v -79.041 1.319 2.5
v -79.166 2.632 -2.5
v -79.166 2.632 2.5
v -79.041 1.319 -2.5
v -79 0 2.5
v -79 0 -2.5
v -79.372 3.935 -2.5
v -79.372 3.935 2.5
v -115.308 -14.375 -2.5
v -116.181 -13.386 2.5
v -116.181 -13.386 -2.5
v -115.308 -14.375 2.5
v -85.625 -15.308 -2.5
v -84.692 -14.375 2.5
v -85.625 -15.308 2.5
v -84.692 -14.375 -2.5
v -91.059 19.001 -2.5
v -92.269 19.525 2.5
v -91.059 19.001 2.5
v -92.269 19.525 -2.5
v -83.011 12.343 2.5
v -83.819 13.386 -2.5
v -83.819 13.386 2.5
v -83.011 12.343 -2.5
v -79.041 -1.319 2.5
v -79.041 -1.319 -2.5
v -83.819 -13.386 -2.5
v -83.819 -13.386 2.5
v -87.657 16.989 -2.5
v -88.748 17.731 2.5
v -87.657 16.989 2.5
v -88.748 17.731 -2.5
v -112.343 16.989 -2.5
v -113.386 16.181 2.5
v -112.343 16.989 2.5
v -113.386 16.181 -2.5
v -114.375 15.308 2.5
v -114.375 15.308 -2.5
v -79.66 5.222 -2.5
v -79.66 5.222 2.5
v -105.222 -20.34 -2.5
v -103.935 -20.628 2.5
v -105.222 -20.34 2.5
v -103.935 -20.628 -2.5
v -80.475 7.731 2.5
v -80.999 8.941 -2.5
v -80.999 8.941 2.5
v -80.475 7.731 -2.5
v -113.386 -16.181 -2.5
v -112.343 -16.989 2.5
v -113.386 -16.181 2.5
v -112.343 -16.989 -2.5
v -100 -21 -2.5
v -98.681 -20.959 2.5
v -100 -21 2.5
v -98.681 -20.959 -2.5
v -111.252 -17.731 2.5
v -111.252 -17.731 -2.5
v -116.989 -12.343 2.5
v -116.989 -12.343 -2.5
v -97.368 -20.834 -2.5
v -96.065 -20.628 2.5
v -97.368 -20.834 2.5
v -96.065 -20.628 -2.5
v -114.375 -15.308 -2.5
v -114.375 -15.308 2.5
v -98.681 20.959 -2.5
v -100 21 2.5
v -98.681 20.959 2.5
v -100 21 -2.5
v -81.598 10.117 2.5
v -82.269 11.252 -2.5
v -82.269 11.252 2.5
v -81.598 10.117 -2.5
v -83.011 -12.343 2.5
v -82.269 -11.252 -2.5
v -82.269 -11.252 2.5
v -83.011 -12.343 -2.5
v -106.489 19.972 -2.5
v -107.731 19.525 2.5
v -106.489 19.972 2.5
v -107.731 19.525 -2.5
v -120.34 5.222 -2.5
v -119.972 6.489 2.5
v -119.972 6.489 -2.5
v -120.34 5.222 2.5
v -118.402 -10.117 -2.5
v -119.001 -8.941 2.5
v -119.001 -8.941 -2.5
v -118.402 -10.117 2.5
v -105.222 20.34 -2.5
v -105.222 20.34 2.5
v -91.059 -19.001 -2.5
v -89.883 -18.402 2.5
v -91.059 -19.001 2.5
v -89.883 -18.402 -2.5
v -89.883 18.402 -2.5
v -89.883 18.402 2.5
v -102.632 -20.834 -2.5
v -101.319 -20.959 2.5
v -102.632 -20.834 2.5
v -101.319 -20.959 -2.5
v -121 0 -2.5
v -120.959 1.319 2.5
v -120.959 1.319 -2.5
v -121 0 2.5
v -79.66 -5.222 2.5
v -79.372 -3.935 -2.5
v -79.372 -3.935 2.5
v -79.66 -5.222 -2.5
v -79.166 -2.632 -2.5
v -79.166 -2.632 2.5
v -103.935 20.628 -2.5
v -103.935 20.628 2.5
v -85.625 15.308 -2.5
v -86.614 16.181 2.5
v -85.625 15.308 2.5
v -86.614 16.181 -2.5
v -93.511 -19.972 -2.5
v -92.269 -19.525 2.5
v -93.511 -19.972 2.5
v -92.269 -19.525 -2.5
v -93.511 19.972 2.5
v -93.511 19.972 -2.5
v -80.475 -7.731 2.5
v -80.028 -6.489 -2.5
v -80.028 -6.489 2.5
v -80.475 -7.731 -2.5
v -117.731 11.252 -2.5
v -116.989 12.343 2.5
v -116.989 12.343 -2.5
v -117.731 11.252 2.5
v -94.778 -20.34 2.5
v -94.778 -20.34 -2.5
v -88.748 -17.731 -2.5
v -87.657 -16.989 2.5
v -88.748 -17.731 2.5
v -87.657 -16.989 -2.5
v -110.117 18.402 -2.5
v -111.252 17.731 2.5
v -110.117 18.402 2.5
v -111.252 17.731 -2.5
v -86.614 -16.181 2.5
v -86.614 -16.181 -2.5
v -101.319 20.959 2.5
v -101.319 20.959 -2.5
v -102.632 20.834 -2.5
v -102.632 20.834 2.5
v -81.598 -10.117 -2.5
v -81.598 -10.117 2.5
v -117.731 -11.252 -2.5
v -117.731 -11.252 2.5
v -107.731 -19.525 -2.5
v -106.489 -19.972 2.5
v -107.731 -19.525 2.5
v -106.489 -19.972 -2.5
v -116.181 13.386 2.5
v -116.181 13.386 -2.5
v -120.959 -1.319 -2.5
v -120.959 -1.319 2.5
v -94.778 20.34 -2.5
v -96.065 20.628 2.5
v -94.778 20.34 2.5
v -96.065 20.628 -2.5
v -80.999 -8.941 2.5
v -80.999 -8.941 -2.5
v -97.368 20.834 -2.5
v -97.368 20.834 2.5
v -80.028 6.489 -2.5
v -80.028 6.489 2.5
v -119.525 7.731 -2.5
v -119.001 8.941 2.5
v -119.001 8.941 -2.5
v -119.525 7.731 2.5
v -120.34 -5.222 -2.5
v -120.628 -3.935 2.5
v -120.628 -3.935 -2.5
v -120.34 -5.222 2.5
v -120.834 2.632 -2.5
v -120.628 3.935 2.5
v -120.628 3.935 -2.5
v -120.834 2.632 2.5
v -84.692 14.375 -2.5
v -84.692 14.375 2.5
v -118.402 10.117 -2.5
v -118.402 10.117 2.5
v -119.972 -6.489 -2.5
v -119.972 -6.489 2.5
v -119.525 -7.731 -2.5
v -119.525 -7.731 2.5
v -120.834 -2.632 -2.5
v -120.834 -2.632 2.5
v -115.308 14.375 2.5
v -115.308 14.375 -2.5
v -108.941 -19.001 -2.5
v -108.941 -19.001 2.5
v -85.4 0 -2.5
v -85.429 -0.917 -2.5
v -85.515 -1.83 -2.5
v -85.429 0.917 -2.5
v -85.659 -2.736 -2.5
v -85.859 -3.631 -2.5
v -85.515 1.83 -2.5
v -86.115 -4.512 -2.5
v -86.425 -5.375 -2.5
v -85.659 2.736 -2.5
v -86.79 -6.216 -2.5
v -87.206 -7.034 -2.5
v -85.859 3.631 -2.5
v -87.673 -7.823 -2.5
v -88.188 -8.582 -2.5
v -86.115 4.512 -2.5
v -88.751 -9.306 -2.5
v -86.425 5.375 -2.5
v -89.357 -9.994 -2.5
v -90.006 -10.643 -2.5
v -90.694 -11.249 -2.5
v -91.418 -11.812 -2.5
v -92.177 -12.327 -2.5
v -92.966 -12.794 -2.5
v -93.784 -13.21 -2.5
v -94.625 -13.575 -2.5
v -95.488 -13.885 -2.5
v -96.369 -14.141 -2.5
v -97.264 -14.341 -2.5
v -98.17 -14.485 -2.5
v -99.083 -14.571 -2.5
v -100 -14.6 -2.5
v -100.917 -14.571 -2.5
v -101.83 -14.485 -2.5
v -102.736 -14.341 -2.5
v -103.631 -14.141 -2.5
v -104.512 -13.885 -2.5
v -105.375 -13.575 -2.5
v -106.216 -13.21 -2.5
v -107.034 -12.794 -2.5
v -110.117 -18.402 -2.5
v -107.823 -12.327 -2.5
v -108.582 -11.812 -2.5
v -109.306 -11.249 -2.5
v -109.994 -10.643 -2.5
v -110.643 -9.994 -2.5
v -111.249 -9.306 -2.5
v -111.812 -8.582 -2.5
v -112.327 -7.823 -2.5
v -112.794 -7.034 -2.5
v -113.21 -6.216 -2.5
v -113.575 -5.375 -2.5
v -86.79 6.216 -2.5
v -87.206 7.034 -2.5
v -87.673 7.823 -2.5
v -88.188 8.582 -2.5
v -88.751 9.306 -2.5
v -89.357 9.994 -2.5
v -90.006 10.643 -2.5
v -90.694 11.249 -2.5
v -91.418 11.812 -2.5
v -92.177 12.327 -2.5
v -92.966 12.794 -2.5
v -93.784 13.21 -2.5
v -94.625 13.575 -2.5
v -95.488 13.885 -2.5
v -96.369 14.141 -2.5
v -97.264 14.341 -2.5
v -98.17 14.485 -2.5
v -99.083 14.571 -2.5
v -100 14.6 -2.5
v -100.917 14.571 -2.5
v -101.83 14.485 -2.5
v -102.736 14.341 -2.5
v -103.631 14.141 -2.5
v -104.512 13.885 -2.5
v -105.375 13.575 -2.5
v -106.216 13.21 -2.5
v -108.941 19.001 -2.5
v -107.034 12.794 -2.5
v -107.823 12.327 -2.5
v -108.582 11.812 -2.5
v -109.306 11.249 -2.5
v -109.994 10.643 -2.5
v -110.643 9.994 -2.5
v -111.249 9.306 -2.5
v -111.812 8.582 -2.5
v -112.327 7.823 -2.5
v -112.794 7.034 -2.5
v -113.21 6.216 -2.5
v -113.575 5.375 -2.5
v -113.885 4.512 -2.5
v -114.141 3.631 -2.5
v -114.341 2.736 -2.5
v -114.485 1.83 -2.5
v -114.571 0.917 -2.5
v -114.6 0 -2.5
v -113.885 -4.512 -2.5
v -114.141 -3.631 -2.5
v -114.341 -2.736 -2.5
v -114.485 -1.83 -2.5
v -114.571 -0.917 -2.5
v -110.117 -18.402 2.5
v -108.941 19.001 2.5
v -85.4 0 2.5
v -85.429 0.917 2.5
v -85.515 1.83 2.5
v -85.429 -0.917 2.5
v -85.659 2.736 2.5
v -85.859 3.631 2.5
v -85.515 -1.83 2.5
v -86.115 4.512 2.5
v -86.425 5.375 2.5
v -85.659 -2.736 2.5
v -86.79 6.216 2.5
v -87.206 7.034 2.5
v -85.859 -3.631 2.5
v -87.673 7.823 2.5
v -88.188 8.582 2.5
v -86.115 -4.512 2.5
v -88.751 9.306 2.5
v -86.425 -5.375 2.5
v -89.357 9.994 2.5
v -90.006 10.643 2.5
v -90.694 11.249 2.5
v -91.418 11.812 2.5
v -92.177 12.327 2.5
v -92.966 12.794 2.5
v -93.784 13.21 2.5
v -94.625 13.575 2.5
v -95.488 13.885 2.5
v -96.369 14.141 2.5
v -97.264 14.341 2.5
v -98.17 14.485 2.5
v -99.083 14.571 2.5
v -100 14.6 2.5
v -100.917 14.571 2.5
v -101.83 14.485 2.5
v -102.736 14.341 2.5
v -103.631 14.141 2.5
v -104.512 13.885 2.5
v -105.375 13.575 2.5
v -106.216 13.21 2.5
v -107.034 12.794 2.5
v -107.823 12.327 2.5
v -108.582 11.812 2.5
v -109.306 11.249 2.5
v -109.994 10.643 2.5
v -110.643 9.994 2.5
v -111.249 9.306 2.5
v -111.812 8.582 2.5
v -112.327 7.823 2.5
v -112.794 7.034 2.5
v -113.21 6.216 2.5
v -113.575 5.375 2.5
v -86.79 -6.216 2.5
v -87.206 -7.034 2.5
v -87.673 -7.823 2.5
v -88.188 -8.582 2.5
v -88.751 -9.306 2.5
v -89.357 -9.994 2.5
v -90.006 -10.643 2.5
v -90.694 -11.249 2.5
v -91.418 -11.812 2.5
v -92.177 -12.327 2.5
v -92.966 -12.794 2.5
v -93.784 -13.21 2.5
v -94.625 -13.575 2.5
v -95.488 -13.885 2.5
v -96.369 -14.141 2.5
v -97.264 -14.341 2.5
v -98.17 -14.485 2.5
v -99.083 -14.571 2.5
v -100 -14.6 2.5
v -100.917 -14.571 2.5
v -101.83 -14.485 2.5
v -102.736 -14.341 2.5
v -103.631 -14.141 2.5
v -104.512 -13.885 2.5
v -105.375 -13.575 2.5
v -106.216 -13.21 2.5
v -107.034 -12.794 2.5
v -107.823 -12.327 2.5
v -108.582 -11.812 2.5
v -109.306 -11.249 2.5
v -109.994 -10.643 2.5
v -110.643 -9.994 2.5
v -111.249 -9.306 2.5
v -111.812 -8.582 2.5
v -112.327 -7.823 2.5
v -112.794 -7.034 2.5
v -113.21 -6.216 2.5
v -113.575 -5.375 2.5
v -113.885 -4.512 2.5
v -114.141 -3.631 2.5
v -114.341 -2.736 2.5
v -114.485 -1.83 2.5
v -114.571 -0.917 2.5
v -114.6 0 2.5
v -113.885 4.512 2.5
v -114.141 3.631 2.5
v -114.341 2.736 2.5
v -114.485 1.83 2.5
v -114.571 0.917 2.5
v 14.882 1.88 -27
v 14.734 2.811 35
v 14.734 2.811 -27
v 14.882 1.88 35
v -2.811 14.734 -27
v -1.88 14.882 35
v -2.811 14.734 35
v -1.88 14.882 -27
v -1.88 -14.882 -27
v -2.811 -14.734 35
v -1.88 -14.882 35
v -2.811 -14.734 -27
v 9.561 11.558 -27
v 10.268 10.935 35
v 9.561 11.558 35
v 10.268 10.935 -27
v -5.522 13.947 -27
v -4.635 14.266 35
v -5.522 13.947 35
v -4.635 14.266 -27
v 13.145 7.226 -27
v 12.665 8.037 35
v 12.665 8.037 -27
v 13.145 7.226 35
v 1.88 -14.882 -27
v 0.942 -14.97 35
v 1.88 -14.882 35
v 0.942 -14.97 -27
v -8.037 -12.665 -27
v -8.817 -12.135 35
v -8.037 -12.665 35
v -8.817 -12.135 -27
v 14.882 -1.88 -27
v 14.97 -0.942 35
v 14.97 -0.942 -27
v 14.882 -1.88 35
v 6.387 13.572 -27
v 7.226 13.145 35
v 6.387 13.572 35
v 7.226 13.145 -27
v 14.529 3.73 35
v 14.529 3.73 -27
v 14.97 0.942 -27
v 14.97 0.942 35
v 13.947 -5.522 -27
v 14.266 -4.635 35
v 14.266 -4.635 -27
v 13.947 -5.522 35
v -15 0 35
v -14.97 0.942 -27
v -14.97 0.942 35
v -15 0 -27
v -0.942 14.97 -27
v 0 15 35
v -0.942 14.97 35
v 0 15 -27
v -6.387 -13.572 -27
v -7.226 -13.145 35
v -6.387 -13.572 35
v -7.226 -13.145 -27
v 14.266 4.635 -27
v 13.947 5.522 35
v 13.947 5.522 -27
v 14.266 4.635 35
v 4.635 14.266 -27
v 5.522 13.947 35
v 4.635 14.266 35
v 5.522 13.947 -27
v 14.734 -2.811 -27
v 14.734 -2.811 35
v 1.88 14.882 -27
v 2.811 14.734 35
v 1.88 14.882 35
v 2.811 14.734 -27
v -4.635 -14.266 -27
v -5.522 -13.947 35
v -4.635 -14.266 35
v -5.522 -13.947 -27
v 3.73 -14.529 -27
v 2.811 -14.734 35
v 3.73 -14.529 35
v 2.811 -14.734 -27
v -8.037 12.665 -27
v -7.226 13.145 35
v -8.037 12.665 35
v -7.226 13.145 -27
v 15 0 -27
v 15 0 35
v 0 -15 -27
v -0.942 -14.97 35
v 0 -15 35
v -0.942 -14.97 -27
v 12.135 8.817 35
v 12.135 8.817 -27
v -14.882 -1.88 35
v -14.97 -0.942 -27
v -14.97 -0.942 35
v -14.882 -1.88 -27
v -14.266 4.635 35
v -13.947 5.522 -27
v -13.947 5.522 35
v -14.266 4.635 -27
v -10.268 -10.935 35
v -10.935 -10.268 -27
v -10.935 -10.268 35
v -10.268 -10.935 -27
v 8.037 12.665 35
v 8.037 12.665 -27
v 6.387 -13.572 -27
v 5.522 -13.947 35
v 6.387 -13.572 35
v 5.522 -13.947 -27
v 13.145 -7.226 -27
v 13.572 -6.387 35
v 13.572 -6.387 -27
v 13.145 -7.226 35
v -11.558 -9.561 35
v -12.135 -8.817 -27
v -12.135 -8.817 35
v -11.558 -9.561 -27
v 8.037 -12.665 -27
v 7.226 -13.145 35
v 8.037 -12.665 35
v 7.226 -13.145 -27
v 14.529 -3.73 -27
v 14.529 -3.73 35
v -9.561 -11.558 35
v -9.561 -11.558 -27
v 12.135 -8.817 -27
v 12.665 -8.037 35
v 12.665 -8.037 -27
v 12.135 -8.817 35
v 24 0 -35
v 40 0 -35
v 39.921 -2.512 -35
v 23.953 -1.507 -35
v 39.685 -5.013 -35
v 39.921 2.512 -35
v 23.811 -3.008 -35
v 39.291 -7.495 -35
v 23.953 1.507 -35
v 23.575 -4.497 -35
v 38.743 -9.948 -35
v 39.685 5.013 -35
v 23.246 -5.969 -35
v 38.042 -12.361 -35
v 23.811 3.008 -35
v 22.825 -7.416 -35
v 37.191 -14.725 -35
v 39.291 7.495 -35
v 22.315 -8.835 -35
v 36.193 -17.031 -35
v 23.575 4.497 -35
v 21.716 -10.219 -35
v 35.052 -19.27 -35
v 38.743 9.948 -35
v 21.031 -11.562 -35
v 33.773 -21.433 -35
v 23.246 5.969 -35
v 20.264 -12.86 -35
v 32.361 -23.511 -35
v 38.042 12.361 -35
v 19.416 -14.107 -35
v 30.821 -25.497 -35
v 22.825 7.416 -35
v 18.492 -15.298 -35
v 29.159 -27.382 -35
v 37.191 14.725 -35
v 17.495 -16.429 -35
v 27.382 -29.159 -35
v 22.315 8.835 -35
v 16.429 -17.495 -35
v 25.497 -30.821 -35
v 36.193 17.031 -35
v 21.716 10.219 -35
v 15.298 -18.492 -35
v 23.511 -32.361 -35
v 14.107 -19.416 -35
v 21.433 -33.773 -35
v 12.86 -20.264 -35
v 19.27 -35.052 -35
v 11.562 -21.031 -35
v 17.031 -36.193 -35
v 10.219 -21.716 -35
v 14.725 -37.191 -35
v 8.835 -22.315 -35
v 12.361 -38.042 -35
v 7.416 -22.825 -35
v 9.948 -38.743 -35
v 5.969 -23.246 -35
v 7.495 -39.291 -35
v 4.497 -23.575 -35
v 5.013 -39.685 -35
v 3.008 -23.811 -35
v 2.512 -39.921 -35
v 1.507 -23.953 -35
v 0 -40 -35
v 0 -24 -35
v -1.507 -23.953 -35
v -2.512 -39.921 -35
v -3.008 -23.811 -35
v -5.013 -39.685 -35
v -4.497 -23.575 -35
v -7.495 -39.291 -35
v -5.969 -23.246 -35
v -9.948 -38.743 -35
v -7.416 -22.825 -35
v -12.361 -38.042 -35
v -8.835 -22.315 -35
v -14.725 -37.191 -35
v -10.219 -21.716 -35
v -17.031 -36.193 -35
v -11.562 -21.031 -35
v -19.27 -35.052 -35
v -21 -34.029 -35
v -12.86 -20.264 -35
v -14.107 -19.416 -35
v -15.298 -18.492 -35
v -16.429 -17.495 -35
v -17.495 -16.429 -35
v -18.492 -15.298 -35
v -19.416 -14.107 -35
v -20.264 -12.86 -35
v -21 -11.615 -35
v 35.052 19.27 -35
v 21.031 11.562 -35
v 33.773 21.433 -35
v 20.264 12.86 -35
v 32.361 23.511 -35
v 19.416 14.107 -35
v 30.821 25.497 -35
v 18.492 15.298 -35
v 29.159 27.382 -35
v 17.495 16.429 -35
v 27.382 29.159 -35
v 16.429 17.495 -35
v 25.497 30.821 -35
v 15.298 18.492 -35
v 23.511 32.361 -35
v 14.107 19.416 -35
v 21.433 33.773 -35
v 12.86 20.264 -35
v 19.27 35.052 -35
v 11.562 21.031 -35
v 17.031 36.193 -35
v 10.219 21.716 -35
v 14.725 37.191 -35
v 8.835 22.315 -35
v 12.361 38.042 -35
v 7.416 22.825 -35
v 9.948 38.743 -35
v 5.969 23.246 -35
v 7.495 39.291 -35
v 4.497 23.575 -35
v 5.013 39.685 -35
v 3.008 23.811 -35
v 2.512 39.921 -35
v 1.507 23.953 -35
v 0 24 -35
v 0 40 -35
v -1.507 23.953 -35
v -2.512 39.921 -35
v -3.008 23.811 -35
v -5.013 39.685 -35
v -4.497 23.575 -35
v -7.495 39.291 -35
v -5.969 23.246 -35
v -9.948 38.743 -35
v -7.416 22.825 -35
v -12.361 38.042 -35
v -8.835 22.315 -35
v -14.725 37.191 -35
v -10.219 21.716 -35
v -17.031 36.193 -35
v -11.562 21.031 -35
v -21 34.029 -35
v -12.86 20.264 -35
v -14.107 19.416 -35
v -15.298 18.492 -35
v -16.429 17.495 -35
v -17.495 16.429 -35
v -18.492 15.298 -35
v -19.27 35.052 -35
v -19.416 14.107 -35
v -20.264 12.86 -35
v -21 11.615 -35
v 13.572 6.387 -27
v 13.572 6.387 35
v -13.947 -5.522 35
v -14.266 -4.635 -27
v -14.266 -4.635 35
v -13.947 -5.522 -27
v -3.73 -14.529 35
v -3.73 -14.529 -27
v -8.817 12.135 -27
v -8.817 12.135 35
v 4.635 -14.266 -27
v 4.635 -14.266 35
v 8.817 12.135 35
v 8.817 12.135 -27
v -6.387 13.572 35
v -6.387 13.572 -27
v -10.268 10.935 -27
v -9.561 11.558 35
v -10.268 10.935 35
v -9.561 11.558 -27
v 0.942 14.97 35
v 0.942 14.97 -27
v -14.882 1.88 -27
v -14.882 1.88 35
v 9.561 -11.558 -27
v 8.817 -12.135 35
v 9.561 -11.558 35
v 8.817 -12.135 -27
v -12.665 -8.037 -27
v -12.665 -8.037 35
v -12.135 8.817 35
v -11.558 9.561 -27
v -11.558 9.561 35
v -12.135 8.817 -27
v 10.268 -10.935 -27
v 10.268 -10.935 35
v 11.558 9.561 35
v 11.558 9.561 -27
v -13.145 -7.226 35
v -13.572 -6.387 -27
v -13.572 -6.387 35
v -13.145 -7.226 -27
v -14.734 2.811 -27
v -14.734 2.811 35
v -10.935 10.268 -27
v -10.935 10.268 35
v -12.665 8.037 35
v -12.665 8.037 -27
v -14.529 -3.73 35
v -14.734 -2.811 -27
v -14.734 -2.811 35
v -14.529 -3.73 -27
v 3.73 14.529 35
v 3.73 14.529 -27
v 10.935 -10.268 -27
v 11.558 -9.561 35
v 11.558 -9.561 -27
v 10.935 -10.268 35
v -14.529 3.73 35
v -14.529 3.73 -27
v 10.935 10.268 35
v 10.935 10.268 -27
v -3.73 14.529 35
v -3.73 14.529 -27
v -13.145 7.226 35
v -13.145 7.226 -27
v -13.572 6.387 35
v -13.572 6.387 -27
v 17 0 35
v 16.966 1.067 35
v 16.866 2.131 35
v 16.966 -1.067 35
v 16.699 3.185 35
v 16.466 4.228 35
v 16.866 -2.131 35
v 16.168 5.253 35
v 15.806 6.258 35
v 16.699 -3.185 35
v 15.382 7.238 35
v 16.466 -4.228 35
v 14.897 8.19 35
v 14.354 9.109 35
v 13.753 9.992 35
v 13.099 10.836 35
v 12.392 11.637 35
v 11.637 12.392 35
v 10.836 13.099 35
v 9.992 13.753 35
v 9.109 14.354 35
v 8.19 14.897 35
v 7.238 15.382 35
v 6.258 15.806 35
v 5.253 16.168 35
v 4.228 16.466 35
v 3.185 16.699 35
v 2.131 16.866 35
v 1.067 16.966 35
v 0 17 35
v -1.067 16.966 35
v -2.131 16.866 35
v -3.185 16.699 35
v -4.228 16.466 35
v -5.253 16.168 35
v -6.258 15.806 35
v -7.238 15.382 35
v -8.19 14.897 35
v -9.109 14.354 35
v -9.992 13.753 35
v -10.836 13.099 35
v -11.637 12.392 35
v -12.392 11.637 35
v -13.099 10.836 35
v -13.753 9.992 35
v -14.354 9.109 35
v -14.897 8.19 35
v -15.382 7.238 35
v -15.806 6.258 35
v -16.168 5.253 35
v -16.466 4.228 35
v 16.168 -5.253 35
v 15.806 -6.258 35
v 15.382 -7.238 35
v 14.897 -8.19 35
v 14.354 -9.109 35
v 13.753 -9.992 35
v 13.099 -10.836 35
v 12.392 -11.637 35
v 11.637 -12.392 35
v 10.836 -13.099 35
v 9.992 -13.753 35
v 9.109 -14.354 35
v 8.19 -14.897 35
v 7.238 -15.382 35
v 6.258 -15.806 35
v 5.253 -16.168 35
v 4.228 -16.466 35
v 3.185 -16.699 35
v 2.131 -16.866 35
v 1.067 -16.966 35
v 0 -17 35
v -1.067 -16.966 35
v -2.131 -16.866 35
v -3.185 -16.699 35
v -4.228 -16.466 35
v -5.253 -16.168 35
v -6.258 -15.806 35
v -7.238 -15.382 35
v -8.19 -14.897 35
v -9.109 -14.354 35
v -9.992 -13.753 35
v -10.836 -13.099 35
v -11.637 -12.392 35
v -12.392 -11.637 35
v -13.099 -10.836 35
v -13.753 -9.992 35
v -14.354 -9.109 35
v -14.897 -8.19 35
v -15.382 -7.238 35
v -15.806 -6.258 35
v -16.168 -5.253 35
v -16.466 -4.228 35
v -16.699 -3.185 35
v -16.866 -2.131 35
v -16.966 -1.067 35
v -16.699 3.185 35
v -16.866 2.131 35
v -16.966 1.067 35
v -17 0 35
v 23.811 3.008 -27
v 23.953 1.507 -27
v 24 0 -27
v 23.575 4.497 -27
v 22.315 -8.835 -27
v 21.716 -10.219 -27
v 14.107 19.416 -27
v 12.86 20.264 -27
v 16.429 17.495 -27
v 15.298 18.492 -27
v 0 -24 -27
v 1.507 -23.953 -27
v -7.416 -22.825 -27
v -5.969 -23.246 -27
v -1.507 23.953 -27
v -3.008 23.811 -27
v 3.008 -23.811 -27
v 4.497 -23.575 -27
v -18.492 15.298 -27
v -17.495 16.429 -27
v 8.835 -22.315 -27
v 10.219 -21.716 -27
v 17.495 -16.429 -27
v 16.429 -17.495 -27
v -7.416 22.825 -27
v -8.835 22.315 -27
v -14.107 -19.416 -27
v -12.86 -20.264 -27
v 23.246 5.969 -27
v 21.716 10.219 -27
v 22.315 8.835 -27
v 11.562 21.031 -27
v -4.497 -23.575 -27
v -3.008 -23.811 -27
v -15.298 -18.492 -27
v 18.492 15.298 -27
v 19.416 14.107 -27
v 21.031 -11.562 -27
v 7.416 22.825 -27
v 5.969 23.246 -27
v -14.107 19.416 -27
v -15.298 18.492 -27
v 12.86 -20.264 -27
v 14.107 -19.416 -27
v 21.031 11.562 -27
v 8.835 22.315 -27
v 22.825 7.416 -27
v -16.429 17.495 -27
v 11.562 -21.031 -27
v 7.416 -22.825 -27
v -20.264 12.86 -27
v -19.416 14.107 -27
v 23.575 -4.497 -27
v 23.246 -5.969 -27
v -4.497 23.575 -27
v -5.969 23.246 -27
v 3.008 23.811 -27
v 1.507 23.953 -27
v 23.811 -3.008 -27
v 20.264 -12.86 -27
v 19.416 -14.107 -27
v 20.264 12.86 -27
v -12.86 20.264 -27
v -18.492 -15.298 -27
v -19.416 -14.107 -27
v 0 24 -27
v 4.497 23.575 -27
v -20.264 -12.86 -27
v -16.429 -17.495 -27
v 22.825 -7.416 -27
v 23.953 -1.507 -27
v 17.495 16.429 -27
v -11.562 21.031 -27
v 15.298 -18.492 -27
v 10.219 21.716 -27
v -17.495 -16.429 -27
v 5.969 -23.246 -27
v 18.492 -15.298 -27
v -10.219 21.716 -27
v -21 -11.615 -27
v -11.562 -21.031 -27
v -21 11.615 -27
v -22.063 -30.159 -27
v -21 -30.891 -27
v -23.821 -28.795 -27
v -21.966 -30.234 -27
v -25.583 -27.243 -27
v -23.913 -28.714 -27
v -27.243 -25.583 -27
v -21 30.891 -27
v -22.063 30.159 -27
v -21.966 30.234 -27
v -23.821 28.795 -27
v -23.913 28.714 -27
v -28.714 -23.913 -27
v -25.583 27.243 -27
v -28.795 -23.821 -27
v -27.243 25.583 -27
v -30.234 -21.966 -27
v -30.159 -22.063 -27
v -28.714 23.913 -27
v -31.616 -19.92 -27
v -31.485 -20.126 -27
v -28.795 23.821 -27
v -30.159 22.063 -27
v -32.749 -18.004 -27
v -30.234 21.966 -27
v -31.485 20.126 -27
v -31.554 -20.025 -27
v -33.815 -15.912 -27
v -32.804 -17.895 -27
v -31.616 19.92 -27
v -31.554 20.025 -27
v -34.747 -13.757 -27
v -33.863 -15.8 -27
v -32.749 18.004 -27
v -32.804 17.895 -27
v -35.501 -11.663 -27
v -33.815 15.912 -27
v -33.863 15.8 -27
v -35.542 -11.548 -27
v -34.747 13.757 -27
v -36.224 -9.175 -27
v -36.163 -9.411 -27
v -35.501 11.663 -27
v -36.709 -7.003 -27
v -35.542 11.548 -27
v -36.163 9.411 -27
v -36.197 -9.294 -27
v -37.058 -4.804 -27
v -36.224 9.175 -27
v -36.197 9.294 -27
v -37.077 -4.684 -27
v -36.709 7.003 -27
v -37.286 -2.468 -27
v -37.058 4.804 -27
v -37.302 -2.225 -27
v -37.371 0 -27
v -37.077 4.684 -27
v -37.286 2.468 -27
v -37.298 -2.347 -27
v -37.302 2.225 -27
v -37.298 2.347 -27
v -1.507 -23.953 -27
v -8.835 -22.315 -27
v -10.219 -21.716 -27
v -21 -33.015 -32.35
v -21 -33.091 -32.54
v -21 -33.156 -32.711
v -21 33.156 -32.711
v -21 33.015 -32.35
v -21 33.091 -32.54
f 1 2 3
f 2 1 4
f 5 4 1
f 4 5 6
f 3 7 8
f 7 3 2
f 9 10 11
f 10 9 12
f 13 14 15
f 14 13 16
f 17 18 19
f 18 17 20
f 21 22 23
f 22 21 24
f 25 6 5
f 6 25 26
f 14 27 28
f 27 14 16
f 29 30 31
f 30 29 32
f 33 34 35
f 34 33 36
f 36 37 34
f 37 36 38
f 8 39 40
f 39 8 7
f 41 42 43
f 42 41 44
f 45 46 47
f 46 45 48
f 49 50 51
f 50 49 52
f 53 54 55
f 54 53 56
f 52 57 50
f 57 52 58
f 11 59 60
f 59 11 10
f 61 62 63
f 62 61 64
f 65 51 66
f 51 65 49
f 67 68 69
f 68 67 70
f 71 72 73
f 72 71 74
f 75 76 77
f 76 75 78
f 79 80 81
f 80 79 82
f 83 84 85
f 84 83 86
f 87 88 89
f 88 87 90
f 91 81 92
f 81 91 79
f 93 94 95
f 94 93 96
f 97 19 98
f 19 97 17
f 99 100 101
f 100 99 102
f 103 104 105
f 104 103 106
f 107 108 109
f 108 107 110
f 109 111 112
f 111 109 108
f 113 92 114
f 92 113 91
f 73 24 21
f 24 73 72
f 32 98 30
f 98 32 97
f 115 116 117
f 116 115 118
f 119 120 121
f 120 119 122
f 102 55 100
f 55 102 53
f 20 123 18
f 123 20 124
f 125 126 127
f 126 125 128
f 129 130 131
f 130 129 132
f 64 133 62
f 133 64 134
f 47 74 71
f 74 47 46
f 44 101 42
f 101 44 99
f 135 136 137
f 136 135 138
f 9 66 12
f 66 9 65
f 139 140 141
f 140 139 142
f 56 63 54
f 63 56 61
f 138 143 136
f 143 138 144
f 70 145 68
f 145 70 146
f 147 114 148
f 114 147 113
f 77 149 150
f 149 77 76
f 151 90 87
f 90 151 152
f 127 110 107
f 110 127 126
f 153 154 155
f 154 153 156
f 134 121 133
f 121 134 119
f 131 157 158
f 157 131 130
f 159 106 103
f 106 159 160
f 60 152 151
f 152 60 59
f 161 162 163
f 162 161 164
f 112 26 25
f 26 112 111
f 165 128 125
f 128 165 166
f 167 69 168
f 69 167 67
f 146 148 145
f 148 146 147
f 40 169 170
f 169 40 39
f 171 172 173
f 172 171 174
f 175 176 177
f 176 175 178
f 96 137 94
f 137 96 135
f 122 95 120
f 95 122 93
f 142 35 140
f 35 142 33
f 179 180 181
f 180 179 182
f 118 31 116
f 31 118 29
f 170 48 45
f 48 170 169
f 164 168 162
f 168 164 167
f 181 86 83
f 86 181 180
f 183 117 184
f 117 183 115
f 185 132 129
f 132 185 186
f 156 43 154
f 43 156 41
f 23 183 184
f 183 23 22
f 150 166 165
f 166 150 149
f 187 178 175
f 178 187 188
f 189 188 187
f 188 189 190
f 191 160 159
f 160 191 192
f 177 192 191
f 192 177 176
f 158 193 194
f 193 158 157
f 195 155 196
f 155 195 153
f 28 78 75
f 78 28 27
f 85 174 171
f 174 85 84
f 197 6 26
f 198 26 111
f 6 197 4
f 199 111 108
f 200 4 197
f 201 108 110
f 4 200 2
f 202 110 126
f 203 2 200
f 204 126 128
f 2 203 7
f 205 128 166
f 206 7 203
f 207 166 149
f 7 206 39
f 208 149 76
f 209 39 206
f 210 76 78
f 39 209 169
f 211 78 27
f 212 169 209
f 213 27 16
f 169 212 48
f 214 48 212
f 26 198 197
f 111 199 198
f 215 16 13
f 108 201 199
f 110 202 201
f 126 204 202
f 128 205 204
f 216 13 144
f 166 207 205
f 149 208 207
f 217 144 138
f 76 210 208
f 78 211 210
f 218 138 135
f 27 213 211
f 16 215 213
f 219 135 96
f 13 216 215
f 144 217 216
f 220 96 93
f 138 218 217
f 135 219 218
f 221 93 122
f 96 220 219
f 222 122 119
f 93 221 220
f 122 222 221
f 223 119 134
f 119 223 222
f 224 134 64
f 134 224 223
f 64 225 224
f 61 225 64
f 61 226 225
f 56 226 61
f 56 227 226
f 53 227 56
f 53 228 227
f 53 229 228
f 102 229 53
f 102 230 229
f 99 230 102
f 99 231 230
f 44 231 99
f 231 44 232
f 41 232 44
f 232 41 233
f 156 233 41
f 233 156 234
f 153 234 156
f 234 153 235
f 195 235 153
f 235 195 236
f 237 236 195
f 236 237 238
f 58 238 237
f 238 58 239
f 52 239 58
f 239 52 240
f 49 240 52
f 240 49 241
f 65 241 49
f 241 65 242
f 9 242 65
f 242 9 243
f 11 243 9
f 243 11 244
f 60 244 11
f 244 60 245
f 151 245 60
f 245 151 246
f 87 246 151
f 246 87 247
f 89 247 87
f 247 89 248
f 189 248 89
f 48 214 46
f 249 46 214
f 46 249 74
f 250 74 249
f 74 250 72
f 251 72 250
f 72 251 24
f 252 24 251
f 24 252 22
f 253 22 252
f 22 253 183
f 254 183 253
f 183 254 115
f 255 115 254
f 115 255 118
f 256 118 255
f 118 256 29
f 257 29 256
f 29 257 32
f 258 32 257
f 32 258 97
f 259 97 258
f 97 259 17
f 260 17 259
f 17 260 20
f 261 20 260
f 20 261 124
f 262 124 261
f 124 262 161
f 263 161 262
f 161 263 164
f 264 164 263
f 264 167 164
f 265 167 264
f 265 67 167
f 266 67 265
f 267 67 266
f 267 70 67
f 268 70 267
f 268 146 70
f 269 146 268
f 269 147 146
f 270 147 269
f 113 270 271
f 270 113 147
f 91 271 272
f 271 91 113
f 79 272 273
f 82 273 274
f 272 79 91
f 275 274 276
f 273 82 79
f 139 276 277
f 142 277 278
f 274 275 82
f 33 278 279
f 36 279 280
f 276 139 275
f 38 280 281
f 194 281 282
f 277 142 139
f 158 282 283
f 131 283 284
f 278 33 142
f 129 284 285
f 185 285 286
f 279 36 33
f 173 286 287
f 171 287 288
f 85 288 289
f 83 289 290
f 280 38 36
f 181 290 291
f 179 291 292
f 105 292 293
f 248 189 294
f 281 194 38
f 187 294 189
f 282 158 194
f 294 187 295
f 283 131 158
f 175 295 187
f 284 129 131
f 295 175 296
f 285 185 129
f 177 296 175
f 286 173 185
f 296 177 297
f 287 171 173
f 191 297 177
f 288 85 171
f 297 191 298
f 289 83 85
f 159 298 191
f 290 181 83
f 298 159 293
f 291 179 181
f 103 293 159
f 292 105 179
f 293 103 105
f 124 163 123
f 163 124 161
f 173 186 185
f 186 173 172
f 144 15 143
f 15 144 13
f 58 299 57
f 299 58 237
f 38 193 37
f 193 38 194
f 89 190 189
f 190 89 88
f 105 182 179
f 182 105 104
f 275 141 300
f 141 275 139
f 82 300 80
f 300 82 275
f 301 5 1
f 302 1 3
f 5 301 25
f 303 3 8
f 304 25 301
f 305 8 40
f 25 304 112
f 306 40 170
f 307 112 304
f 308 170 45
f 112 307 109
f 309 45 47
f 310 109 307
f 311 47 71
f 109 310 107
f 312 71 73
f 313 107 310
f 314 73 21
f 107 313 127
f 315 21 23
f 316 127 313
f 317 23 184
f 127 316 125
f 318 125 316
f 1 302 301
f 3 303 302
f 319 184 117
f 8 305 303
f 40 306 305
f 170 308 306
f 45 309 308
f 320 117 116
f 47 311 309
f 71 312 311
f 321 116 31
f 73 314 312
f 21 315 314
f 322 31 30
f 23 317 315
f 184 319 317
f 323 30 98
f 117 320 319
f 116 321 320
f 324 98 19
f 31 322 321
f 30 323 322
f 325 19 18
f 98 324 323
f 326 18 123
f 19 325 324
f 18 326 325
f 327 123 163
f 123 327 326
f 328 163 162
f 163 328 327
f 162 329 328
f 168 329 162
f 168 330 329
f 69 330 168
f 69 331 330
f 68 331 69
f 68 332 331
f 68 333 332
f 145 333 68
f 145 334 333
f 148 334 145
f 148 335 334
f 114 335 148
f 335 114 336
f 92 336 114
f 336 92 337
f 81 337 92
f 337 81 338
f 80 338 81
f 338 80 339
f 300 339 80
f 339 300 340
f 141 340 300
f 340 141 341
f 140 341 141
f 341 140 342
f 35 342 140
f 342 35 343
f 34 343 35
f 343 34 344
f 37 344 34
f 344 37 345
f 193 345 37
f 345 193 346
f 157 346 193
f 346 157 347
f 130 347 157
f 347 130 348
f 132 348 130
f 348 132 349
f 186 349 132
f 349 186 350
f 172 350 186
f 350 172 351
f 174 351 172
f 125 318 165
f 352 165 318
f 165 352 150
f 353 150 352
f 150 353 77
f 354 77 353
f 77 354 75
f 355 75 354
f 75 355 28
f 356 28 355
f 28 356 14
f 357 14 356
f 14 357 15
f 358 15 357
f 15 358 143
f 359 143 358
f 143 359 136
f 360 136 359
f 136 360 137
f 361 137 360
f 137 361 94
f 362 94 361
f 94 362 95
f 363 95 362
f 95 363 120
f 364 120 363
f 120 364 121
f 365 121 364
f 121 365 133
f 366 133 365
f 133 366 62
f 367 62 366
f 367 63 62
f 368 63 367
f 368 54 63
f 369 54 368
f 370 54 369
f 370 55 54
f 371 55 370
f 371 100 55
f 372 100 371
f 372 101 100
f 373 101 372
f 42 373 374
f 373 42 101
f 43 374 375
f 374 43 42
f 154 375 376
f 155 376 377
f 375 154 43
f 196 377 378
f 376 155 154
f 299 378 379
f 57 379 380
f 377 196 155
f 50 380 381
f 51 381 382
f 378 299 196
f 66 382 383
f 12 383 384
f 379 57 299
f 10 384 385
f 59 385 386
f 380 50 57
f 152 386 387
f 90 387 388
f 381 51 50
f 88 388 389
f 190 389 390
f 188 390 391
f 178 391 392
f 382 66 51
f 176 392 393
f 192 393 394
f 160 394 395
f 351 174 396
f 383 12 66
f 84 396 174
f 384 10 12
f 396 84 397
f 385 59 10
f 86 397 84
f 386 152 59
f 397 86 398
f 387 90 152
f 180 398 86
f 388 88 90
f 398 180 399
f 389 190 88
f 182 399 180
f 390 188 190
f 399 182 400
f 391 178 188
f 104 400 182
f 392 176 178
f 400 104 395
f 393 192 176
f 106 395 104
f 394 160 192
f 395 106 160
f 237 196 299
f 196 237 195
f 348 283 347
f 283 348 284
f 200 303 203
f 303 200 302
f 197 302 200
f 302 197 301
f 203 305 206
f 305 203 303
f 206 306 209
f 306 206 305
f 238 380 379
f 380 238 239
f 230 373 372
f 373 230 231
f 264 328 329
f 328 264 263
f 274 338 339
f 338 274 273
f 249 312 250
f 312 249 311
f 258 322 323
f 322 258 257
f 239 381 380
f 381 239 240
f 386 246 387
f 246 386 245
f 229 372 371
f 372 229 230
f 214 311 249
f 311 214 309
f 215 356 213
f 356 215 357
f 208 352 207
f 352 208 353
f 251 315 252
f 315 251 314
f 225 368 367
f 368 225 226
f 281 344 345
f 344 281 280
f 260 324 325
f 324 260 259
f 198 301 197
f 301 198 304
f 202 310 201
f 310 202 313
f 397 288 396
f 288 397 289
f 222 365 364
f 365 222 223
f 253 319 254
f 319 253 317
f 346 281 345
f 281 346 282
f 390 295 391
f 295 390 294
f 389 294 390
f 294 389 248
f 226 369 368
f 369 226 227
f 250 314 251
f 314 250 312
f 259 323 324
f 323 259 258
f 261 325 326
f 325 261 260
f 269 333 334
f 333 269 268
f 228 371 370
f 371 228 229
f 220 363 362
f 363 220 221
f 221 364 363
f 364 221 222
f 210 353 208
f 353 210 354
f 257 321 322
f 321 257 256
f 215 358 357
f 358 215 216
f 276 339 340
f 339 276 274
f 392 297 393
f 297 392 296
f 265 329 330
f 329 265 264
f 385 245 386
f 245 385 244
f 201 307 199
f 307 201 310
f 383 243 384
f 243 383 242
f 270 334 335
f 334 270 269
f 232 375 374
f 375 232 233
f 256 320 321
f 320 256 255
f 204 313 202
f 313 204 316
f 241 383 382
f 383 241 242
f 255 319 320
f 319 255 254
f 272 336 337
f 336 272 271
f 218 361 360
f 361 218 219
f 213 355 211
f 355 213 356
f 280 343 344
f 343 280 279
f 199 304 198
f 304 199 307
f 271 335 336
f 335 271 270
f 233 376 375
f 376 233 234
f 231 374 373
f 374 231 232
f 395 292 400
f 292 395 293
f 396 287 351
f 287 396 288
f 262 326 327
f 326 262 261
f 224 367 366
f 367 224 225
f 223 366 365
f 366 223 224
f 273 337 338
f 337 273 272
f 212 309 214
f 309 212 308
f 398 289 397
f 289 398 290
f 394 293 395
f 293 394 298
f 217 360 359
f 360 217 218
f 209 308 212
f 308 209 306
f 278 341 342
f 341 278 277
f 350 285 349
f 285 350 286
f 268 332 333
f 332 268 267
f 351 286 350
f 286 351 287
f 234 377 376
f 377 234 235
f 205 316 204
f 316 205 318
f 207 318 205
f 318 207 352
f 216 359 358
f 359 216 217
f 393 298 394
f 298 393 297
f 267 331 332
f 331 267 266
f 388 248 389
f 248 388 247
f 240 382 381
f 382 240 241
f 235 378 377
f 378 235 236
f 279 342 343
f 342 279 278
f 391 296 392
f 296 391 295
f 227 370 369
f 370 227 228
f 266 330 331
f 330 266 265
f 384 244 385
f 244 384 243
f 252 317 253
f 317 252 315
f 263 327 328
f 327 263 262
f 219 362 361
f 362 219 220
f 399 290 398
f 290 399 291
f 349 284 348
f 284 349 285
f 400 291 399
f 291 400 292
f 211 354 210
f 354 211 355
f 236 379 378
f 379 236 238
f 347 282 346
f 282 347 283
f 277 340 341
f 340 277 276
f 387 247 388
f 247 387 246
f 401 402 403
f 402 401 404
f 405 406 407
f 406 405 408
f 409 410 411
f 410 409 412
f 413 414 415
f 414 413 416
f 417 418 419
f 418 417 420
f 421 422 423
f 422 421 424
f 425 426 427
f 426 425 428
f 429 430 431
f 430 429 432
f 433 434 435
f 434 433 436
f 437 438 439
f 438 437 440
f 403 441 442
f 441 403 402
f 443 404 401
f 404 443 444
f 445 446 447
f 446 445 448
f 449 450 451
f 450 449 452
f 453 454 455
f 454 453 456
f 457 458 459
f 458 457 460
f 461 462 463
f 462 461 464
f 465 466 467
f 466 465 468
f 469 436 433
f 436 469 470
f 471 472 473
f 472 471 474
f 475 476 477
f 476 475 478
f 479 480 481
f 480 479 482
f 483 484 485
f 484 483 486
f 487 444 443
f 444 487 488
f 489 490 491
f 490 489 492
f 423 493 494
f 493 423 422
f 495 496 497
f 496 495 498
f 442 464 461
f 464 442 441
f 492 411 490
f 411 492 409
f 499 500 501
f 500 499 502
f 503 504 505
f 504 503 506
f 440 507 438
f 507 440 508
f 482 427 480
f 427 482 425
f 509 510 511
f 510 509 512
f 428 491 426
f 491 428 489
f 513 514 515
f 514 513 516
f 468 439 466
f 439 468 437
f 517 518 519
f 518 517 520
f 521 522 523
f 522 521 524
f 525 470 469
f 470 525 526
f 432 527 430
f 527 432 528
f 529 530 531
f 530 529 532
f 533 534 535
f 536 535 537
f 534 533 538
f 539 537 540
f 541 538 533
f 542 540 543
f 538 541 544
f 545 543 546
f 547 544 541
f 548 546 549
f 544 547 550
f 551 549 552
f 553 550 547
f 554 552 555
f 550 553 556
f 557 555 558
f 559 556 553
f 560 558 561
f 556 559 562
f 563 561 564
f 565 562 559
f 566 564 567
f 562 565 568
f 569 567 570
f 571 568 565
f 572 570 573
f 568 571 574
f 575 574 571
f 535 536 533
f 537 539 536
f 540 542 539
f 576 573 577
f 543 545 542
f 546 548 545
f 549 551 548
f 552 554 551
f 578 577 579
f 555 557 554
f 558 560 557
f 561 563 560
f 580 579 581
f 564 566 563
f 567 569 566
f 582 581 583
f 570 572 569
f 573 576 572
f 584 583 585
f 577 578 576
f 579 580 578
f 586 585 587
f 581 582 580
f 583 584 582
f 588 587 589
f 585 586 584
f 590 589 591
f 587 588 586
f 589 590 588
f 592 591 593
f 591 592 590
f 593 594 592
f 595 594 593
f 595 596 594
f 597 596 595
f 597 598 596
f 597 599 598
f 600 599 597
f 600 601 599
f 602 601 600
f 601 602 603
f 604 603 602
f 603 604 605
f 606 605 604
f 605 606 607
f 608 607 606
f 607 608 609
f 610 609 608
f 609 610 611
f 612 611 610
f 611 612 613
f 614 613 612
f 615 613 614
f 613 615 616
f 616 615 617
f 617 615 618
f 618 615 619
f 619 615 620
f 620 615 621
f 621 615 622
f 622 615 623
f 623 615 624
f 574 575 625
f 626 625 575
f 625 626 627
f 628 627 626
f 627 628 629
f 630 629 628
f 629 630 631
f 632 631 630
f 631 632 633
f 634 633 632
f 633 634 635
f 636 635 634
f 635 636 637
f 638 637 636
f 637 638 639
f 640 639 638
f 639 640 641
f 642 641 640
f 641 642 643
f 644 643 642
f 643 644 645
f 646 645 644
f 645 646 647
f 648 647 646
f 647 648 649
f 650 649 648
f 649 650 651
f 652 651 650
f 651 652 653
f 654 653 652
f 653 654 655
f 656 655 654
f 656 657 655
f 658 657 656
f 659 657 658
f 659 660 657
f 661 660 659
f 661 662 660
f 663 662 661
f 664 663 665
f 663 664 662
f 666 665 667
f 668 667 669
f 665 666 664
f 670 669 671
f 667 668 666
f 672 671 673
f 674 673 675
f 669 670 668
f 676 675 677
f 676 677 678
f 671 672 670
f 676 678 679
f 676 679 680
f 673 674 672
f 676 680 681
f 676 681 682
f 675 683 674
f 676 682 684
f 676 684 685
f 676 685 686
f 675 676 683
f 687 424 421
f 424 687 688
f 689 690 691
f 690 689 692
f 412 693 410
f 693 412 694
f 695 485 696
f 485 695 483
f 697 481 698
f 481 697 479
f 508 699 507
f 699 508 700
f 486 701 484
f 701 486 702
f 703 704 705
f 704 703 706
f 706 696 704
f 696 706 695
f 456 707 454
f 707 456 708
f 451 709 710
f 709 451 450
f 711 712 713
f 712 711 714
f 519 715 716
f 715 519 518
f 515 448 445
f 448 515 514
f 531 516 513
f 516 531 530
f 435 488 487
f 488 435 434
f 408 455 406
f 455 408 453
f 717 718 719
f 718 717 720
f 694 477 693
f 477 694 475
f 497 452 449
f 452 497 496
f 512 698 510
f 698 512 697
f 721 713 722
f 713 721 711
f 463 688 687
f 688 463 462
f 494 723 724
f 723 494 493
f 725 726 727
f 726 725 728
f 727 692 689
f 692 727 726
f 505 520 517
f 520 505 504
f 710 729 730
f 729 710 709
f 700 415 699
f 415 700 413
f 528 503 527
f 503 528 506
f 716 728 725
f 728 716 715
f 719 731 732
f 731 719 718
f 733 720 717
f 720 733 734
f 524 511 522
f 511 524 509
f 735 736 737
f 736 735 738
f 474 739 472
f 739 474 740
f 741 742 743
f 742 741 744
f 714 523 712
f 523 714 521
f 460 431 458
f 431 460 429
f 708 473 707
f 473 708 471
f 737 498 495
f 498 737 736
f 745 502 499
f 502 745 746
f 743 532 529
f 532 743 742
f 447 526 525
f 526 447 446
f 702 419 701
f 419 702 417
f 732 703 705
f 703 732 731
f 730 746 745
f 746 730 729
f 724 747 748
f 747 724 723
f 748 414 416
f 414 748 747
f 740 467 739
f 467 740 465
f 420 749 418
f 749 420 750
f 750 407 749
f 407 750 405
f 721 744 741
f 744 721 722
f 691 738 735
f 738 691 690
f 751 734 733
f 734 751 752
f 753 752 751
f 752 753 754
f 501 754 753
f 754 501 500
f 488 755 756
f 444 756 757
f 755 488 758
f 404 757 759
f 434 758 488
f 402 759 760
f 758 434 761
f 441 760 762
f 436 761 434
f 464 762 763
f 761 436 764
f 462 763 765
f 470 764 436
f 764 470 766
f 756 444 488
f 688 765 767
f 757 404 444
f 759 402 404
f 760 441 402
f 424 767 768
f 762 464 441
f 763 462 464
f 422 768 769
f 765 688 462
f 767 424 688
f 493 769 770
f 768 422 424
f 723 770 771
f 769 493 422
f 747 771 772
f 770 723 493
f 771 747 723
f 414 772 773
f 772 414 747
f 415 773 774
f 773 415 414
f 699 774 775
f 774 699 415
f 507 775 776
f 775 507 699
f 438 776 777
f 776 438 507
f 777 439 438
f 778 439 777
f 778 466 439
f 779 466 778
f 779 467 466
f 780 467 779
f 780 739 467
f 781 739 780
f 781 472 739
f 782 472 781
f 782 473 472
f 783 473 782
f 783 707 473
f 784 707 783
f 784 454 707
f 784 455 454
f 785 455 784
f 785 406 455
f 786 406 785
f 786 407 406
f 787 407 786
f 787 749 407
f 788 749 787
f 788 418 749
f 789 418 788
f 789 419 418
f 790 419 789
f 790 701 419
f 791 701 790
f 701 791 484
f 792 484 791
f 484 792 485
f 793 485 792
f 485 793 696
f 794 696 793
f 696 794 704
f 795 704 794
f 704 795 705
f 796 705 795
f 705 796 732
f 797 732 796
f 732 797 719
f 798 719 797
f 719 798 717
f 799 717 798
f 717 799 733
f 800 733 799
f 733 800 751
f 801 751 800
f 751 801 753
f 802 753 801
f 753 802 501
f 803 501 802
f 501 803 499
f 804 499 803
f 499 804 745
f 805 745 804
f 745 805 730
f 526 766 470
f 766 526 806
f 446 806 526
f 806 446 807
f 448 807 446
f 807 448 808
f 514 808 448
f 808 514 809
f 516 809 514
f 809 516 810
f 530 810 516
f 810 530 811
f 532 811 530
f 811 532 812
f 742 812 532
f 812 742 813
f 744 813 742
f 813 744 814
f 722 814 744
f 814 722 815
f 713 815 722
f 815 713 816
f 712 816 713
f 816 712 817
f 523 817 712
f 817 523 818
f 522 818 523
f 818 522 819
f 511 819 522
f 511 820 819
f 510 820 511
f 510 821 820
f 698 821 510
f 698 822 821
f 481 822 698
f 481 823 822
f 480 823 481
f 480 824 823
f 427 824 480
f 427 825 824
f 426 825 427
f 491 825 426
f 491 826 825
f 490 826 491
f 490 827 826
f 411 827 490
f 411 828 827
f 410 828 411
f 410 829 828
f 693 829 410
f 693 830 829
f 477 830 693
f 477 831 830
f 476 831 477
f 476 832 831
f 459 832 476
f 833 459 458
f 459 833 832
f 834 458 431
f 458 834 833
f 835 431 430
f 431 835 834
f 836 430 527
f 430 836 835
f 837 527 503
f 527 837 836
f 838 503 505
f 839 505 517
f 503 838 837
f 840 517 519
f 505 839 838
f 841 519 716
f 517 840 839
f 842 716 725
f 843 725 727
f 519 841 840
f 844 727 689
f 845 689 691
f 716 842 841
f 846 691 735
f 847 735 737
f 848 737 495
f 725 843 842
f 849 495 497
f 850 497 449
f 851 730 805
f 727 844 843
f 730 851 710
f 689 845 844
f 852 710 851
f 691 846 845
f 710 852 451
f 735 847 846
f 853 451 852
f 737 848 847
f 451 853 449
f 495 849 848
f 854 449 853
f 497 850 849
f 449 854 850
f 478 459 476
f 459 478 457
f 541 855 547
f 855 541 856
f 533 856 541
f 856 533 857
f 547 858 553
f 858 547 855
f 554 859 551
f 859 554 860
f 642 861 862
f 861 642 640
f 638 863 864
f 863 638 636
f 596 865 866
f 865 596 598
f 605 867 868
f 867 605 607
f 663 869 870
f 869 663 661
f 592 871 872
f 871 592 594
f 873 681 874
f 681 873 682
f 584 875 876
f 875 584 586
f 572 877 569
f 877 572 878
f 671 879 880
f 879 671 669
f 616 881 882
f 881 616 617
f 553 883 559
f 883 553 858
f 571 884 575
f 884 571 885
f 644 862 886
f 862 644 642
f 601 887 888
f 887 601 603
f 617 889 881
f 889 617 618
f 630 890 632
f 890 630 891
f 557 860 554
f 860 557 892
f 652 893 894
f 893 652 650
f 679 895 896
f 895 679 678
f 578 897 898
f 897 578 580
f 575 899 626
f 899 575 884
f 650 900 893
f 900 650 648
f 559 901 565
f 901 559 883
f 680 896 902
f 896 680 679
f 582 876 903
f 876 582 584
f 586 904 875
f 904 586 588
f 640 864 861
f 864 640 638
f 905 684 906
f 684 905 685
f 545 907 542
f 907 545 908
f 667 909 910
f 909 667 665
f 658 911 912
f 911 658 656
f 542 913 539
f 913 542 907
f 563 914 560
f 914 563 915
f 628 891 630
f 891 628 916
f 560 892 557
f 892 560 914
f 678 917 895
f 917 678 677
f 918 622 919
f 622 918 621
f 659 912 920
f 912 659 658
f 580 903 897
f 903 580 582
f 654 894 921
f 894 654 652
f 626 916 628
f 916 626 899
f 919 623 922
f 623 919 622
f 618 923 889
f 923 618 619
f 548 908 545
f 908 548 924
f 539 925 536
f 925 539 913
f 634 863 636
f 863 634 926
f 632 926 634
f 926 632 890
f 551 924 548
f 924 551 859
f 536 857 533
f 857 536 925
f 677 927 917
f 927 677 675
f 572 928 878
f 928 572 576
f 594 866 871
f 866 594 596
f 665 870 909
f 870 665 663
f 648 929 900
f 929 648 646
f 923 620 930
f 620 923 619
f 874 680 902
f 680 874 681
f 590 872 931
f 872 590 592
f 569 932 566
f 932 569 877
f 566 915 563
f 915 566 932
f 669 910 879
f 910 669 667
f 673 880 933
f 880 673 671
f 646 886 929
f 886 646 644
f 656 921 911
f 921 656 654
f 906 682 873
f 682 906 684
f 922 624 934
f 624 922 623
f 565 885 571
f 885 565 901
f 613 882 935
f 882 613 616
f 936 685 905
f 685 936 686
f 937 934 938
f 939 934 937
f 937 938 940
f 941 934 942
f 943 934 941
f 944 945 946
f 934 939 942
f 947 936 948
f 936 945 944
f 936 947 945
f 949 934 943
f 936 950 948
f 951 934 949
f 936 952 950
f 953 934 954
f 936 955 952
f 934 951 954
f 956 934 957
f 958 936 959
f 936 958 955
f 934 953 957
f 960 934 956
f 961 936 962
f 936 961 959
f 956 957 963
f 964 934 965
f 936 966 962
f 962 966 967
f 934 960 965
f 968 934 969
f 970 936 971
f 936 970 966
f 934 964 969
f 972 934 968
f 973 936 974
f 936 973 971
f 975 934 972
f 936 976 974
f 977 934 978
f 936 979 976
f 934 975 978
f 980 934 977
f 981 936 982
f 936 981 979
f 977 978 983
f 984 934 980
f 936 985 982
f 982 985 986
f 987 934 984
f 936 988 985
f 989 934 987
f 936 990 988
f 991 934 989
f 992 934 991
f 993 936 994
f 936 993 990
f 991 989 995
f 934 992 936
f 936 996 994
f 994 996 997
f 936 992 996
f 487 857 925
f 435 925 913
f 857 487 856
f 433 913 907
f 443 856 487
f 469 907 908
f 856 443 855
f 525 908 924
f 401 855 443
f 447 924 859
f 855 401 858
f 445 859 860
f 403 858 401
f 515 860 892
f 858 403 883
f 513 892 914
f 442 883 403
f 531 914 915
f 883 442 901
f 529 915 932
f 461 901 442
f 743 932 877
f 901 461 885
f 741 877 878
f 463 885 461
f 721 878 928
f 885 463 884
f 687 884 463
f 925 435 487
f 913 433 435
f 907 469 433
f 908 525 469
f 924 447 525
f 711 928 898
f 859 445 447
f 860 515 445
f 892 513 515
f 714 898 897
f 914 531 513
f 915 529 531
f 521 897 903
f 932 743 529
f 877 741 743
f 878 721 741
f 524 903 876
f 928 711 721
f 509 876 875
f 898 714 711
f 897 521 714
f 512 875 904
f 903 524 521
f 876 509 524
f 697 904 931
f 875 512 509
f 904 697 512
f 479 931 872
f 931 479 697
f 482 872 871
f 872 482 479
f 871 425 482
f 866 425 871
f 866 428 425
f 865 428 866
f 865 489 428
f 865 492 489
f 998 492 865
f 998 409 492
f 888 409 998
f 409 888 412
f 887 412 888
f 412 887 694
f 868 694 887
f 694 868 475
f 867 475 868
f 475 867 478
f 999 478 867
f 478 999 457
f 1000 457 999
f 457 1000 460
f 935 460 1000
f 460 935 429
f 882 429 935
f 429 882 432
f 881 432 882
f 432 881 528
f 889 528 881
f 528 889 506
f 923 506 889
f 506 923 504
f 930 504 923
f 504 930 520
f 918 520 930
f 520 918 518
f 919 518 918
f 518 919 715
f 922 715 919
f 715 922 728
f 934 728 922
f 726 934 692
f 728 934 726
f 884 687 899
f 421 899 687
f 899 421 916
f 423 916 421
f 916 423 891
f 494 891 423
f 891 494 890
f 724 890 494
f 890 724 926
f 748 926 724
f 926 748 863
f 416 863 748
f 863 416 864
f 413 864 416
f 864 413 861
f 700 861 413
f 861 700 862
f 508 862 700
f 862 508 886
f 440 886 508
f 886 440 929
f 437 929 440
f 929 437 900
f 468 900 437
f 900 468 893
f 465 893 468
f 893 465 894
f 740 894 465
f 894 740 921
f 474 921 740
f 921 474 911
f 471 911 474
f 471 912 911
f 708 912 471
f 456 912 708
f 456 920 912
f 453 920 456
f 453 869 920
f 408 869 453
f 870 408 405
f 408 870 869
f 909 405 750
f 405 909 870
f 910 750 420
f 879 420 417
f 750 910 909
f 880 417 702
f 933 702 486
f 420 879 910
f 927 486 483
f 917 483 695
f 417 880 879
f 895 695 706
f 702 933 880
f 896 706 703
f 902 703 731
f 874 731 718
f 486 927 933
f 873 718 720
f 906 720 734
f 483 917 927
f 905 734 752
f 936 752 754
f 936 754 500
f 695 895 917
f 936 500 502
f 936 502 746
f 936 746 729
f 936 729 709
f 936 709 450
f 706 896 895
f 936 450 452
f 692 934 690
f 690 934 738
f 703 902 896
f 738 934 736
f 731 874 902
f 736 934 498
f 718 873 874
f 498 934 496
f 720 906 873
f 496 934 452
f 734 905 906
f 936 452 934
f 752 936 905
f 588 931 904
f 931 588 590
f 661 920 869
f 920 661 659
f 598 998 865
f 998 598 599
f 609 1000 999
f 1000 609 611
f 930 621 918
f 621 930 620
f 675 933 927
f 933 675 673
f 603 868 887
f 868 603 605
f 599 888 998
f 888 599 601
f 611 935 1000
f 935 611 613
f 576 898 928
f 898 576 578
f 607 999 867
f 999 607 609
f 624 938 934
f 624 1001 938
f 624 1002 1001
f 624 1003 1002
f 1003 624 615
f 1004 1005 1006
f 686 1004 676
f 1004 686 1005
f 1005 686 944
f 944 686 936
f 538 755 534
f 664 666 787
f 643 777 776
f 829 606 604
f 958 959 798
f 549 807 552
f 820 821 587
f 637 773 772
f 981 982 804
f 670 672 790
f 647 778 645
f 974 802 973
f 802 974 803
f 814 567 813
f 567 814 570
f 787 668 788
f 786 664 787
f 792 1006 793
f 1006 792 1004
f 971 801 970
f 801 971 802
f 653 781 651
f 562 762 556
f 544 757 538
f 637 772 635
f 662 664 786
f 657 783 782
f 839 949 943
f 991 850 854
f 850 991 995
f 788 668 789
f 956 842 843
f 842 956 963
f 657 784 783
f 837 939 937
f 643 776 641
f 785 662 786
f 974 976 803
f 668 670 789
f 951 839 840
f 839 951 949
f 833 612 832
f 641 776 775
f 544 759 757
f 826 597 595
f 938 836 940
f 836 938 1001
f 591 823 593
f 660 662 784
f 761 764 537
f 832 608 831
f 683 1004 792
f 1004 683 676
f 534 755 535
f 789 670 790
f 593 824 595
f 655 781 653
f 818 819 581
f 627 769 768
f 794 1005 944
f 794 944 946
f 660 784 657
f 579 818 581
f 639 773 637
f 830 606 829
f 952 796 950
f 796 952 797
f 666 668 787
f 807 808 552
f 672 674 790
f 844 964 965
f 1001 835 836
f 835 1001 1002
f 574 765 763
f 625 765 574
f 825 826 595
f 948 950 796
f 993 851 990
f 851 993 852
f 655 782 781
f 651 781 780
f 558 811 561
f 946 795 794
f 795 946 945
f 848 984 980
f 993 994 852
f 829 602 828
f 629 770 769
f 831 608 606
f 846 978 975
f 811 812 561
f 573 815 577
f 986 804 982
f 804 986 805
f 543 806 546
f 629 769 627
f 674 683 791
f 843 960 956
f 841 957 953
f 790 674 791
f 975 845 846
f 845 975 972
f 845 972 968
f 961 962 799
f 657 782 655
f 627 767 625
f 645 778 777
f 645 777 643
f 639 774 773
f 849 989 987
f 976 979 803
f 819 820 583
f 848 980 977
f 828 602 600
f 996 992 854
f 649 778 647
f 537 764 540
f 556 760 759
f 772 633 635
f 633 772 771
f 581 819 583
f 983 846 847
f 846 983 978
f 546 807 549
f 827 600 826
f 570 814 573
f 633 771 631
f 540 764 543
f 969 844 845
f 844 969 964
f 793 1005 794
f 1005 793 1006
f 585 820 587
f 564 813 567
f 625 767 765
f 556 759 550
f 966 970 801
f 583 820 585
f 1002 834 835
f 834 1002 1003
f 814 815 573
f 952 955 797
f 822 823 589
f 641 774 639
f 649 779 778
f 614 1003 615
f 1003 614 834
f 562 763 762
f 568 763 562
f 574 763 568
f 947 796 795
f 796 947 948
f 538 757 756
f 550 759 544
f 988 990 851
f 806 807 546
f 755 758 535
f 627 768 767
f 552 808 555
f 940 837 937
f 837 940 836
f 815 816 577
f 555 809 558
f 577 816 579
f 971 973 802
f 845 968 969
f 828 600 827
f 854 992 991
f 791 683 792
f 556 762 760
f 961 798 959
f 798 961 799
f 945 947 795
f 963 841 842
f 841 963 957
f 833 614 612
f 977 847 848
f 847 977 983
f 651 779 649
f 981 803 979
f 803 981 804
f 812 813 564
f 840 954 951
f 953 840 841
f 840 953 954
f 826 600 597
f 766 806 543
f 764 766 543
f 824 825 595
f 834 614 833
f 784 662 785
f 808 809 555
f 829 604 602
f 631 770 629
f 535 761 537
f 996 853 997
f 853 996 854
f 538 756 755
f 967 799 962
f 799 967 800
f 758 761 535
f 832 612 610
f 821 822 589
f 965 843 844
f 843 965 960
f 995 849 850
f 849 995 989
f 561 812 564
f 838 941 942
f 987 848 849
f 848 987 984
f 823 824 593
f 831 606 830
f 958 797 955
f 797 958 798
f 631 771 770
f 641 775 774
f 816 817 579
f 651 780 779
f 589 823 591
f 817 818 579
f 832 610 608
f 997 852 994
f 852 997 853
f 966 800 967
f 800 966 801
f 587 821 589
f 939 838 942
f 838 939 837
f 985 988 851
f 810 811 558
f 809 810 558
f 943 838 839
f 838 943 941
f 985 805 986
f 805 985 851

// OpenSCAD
/// Inside support for the tube ///
/// The inner diameter of the holders has to be adjusted according to the outer diameter of the tube used ///

h5=5;
r5=21;
h6=5;
r7=1.2;
h7=5;
r7=14.6;

module in_plus(){
    translate ([-100,0,0]) {cylinder (h5, r5, r5, $fn = 100, center = true);}

}

module in_minus(){
    translate ([-100,0,0]) {cylinder (h7, r7, r7, $fn = 100, center = true);}

}

{difference(){in_plus(); in_minus();}}


///Outside support for the tube///

h1=70;
h2=8;
r1=80/2;
r2=34/2;
r3=30/2;
r4=48/2;
x=28;
y=80;
z=9;

module plus(){
    translate ([0,0,0]) cylinder (h1, r1, r2, $fn = 100, center = true);
       
}

module minus(){
    translate ([0,0,0]) cylinder (h1, r3, r3, $fn = 100, center = true);
    
    translate ([0,0,-31]) cylinder (h2, r4, r4, $fn = 100, center = true);
    
    translate ([-35,0,-31.5]) cube ([x, y, z], center = true); 
    
}

{difference() {plus(); minus();}}
